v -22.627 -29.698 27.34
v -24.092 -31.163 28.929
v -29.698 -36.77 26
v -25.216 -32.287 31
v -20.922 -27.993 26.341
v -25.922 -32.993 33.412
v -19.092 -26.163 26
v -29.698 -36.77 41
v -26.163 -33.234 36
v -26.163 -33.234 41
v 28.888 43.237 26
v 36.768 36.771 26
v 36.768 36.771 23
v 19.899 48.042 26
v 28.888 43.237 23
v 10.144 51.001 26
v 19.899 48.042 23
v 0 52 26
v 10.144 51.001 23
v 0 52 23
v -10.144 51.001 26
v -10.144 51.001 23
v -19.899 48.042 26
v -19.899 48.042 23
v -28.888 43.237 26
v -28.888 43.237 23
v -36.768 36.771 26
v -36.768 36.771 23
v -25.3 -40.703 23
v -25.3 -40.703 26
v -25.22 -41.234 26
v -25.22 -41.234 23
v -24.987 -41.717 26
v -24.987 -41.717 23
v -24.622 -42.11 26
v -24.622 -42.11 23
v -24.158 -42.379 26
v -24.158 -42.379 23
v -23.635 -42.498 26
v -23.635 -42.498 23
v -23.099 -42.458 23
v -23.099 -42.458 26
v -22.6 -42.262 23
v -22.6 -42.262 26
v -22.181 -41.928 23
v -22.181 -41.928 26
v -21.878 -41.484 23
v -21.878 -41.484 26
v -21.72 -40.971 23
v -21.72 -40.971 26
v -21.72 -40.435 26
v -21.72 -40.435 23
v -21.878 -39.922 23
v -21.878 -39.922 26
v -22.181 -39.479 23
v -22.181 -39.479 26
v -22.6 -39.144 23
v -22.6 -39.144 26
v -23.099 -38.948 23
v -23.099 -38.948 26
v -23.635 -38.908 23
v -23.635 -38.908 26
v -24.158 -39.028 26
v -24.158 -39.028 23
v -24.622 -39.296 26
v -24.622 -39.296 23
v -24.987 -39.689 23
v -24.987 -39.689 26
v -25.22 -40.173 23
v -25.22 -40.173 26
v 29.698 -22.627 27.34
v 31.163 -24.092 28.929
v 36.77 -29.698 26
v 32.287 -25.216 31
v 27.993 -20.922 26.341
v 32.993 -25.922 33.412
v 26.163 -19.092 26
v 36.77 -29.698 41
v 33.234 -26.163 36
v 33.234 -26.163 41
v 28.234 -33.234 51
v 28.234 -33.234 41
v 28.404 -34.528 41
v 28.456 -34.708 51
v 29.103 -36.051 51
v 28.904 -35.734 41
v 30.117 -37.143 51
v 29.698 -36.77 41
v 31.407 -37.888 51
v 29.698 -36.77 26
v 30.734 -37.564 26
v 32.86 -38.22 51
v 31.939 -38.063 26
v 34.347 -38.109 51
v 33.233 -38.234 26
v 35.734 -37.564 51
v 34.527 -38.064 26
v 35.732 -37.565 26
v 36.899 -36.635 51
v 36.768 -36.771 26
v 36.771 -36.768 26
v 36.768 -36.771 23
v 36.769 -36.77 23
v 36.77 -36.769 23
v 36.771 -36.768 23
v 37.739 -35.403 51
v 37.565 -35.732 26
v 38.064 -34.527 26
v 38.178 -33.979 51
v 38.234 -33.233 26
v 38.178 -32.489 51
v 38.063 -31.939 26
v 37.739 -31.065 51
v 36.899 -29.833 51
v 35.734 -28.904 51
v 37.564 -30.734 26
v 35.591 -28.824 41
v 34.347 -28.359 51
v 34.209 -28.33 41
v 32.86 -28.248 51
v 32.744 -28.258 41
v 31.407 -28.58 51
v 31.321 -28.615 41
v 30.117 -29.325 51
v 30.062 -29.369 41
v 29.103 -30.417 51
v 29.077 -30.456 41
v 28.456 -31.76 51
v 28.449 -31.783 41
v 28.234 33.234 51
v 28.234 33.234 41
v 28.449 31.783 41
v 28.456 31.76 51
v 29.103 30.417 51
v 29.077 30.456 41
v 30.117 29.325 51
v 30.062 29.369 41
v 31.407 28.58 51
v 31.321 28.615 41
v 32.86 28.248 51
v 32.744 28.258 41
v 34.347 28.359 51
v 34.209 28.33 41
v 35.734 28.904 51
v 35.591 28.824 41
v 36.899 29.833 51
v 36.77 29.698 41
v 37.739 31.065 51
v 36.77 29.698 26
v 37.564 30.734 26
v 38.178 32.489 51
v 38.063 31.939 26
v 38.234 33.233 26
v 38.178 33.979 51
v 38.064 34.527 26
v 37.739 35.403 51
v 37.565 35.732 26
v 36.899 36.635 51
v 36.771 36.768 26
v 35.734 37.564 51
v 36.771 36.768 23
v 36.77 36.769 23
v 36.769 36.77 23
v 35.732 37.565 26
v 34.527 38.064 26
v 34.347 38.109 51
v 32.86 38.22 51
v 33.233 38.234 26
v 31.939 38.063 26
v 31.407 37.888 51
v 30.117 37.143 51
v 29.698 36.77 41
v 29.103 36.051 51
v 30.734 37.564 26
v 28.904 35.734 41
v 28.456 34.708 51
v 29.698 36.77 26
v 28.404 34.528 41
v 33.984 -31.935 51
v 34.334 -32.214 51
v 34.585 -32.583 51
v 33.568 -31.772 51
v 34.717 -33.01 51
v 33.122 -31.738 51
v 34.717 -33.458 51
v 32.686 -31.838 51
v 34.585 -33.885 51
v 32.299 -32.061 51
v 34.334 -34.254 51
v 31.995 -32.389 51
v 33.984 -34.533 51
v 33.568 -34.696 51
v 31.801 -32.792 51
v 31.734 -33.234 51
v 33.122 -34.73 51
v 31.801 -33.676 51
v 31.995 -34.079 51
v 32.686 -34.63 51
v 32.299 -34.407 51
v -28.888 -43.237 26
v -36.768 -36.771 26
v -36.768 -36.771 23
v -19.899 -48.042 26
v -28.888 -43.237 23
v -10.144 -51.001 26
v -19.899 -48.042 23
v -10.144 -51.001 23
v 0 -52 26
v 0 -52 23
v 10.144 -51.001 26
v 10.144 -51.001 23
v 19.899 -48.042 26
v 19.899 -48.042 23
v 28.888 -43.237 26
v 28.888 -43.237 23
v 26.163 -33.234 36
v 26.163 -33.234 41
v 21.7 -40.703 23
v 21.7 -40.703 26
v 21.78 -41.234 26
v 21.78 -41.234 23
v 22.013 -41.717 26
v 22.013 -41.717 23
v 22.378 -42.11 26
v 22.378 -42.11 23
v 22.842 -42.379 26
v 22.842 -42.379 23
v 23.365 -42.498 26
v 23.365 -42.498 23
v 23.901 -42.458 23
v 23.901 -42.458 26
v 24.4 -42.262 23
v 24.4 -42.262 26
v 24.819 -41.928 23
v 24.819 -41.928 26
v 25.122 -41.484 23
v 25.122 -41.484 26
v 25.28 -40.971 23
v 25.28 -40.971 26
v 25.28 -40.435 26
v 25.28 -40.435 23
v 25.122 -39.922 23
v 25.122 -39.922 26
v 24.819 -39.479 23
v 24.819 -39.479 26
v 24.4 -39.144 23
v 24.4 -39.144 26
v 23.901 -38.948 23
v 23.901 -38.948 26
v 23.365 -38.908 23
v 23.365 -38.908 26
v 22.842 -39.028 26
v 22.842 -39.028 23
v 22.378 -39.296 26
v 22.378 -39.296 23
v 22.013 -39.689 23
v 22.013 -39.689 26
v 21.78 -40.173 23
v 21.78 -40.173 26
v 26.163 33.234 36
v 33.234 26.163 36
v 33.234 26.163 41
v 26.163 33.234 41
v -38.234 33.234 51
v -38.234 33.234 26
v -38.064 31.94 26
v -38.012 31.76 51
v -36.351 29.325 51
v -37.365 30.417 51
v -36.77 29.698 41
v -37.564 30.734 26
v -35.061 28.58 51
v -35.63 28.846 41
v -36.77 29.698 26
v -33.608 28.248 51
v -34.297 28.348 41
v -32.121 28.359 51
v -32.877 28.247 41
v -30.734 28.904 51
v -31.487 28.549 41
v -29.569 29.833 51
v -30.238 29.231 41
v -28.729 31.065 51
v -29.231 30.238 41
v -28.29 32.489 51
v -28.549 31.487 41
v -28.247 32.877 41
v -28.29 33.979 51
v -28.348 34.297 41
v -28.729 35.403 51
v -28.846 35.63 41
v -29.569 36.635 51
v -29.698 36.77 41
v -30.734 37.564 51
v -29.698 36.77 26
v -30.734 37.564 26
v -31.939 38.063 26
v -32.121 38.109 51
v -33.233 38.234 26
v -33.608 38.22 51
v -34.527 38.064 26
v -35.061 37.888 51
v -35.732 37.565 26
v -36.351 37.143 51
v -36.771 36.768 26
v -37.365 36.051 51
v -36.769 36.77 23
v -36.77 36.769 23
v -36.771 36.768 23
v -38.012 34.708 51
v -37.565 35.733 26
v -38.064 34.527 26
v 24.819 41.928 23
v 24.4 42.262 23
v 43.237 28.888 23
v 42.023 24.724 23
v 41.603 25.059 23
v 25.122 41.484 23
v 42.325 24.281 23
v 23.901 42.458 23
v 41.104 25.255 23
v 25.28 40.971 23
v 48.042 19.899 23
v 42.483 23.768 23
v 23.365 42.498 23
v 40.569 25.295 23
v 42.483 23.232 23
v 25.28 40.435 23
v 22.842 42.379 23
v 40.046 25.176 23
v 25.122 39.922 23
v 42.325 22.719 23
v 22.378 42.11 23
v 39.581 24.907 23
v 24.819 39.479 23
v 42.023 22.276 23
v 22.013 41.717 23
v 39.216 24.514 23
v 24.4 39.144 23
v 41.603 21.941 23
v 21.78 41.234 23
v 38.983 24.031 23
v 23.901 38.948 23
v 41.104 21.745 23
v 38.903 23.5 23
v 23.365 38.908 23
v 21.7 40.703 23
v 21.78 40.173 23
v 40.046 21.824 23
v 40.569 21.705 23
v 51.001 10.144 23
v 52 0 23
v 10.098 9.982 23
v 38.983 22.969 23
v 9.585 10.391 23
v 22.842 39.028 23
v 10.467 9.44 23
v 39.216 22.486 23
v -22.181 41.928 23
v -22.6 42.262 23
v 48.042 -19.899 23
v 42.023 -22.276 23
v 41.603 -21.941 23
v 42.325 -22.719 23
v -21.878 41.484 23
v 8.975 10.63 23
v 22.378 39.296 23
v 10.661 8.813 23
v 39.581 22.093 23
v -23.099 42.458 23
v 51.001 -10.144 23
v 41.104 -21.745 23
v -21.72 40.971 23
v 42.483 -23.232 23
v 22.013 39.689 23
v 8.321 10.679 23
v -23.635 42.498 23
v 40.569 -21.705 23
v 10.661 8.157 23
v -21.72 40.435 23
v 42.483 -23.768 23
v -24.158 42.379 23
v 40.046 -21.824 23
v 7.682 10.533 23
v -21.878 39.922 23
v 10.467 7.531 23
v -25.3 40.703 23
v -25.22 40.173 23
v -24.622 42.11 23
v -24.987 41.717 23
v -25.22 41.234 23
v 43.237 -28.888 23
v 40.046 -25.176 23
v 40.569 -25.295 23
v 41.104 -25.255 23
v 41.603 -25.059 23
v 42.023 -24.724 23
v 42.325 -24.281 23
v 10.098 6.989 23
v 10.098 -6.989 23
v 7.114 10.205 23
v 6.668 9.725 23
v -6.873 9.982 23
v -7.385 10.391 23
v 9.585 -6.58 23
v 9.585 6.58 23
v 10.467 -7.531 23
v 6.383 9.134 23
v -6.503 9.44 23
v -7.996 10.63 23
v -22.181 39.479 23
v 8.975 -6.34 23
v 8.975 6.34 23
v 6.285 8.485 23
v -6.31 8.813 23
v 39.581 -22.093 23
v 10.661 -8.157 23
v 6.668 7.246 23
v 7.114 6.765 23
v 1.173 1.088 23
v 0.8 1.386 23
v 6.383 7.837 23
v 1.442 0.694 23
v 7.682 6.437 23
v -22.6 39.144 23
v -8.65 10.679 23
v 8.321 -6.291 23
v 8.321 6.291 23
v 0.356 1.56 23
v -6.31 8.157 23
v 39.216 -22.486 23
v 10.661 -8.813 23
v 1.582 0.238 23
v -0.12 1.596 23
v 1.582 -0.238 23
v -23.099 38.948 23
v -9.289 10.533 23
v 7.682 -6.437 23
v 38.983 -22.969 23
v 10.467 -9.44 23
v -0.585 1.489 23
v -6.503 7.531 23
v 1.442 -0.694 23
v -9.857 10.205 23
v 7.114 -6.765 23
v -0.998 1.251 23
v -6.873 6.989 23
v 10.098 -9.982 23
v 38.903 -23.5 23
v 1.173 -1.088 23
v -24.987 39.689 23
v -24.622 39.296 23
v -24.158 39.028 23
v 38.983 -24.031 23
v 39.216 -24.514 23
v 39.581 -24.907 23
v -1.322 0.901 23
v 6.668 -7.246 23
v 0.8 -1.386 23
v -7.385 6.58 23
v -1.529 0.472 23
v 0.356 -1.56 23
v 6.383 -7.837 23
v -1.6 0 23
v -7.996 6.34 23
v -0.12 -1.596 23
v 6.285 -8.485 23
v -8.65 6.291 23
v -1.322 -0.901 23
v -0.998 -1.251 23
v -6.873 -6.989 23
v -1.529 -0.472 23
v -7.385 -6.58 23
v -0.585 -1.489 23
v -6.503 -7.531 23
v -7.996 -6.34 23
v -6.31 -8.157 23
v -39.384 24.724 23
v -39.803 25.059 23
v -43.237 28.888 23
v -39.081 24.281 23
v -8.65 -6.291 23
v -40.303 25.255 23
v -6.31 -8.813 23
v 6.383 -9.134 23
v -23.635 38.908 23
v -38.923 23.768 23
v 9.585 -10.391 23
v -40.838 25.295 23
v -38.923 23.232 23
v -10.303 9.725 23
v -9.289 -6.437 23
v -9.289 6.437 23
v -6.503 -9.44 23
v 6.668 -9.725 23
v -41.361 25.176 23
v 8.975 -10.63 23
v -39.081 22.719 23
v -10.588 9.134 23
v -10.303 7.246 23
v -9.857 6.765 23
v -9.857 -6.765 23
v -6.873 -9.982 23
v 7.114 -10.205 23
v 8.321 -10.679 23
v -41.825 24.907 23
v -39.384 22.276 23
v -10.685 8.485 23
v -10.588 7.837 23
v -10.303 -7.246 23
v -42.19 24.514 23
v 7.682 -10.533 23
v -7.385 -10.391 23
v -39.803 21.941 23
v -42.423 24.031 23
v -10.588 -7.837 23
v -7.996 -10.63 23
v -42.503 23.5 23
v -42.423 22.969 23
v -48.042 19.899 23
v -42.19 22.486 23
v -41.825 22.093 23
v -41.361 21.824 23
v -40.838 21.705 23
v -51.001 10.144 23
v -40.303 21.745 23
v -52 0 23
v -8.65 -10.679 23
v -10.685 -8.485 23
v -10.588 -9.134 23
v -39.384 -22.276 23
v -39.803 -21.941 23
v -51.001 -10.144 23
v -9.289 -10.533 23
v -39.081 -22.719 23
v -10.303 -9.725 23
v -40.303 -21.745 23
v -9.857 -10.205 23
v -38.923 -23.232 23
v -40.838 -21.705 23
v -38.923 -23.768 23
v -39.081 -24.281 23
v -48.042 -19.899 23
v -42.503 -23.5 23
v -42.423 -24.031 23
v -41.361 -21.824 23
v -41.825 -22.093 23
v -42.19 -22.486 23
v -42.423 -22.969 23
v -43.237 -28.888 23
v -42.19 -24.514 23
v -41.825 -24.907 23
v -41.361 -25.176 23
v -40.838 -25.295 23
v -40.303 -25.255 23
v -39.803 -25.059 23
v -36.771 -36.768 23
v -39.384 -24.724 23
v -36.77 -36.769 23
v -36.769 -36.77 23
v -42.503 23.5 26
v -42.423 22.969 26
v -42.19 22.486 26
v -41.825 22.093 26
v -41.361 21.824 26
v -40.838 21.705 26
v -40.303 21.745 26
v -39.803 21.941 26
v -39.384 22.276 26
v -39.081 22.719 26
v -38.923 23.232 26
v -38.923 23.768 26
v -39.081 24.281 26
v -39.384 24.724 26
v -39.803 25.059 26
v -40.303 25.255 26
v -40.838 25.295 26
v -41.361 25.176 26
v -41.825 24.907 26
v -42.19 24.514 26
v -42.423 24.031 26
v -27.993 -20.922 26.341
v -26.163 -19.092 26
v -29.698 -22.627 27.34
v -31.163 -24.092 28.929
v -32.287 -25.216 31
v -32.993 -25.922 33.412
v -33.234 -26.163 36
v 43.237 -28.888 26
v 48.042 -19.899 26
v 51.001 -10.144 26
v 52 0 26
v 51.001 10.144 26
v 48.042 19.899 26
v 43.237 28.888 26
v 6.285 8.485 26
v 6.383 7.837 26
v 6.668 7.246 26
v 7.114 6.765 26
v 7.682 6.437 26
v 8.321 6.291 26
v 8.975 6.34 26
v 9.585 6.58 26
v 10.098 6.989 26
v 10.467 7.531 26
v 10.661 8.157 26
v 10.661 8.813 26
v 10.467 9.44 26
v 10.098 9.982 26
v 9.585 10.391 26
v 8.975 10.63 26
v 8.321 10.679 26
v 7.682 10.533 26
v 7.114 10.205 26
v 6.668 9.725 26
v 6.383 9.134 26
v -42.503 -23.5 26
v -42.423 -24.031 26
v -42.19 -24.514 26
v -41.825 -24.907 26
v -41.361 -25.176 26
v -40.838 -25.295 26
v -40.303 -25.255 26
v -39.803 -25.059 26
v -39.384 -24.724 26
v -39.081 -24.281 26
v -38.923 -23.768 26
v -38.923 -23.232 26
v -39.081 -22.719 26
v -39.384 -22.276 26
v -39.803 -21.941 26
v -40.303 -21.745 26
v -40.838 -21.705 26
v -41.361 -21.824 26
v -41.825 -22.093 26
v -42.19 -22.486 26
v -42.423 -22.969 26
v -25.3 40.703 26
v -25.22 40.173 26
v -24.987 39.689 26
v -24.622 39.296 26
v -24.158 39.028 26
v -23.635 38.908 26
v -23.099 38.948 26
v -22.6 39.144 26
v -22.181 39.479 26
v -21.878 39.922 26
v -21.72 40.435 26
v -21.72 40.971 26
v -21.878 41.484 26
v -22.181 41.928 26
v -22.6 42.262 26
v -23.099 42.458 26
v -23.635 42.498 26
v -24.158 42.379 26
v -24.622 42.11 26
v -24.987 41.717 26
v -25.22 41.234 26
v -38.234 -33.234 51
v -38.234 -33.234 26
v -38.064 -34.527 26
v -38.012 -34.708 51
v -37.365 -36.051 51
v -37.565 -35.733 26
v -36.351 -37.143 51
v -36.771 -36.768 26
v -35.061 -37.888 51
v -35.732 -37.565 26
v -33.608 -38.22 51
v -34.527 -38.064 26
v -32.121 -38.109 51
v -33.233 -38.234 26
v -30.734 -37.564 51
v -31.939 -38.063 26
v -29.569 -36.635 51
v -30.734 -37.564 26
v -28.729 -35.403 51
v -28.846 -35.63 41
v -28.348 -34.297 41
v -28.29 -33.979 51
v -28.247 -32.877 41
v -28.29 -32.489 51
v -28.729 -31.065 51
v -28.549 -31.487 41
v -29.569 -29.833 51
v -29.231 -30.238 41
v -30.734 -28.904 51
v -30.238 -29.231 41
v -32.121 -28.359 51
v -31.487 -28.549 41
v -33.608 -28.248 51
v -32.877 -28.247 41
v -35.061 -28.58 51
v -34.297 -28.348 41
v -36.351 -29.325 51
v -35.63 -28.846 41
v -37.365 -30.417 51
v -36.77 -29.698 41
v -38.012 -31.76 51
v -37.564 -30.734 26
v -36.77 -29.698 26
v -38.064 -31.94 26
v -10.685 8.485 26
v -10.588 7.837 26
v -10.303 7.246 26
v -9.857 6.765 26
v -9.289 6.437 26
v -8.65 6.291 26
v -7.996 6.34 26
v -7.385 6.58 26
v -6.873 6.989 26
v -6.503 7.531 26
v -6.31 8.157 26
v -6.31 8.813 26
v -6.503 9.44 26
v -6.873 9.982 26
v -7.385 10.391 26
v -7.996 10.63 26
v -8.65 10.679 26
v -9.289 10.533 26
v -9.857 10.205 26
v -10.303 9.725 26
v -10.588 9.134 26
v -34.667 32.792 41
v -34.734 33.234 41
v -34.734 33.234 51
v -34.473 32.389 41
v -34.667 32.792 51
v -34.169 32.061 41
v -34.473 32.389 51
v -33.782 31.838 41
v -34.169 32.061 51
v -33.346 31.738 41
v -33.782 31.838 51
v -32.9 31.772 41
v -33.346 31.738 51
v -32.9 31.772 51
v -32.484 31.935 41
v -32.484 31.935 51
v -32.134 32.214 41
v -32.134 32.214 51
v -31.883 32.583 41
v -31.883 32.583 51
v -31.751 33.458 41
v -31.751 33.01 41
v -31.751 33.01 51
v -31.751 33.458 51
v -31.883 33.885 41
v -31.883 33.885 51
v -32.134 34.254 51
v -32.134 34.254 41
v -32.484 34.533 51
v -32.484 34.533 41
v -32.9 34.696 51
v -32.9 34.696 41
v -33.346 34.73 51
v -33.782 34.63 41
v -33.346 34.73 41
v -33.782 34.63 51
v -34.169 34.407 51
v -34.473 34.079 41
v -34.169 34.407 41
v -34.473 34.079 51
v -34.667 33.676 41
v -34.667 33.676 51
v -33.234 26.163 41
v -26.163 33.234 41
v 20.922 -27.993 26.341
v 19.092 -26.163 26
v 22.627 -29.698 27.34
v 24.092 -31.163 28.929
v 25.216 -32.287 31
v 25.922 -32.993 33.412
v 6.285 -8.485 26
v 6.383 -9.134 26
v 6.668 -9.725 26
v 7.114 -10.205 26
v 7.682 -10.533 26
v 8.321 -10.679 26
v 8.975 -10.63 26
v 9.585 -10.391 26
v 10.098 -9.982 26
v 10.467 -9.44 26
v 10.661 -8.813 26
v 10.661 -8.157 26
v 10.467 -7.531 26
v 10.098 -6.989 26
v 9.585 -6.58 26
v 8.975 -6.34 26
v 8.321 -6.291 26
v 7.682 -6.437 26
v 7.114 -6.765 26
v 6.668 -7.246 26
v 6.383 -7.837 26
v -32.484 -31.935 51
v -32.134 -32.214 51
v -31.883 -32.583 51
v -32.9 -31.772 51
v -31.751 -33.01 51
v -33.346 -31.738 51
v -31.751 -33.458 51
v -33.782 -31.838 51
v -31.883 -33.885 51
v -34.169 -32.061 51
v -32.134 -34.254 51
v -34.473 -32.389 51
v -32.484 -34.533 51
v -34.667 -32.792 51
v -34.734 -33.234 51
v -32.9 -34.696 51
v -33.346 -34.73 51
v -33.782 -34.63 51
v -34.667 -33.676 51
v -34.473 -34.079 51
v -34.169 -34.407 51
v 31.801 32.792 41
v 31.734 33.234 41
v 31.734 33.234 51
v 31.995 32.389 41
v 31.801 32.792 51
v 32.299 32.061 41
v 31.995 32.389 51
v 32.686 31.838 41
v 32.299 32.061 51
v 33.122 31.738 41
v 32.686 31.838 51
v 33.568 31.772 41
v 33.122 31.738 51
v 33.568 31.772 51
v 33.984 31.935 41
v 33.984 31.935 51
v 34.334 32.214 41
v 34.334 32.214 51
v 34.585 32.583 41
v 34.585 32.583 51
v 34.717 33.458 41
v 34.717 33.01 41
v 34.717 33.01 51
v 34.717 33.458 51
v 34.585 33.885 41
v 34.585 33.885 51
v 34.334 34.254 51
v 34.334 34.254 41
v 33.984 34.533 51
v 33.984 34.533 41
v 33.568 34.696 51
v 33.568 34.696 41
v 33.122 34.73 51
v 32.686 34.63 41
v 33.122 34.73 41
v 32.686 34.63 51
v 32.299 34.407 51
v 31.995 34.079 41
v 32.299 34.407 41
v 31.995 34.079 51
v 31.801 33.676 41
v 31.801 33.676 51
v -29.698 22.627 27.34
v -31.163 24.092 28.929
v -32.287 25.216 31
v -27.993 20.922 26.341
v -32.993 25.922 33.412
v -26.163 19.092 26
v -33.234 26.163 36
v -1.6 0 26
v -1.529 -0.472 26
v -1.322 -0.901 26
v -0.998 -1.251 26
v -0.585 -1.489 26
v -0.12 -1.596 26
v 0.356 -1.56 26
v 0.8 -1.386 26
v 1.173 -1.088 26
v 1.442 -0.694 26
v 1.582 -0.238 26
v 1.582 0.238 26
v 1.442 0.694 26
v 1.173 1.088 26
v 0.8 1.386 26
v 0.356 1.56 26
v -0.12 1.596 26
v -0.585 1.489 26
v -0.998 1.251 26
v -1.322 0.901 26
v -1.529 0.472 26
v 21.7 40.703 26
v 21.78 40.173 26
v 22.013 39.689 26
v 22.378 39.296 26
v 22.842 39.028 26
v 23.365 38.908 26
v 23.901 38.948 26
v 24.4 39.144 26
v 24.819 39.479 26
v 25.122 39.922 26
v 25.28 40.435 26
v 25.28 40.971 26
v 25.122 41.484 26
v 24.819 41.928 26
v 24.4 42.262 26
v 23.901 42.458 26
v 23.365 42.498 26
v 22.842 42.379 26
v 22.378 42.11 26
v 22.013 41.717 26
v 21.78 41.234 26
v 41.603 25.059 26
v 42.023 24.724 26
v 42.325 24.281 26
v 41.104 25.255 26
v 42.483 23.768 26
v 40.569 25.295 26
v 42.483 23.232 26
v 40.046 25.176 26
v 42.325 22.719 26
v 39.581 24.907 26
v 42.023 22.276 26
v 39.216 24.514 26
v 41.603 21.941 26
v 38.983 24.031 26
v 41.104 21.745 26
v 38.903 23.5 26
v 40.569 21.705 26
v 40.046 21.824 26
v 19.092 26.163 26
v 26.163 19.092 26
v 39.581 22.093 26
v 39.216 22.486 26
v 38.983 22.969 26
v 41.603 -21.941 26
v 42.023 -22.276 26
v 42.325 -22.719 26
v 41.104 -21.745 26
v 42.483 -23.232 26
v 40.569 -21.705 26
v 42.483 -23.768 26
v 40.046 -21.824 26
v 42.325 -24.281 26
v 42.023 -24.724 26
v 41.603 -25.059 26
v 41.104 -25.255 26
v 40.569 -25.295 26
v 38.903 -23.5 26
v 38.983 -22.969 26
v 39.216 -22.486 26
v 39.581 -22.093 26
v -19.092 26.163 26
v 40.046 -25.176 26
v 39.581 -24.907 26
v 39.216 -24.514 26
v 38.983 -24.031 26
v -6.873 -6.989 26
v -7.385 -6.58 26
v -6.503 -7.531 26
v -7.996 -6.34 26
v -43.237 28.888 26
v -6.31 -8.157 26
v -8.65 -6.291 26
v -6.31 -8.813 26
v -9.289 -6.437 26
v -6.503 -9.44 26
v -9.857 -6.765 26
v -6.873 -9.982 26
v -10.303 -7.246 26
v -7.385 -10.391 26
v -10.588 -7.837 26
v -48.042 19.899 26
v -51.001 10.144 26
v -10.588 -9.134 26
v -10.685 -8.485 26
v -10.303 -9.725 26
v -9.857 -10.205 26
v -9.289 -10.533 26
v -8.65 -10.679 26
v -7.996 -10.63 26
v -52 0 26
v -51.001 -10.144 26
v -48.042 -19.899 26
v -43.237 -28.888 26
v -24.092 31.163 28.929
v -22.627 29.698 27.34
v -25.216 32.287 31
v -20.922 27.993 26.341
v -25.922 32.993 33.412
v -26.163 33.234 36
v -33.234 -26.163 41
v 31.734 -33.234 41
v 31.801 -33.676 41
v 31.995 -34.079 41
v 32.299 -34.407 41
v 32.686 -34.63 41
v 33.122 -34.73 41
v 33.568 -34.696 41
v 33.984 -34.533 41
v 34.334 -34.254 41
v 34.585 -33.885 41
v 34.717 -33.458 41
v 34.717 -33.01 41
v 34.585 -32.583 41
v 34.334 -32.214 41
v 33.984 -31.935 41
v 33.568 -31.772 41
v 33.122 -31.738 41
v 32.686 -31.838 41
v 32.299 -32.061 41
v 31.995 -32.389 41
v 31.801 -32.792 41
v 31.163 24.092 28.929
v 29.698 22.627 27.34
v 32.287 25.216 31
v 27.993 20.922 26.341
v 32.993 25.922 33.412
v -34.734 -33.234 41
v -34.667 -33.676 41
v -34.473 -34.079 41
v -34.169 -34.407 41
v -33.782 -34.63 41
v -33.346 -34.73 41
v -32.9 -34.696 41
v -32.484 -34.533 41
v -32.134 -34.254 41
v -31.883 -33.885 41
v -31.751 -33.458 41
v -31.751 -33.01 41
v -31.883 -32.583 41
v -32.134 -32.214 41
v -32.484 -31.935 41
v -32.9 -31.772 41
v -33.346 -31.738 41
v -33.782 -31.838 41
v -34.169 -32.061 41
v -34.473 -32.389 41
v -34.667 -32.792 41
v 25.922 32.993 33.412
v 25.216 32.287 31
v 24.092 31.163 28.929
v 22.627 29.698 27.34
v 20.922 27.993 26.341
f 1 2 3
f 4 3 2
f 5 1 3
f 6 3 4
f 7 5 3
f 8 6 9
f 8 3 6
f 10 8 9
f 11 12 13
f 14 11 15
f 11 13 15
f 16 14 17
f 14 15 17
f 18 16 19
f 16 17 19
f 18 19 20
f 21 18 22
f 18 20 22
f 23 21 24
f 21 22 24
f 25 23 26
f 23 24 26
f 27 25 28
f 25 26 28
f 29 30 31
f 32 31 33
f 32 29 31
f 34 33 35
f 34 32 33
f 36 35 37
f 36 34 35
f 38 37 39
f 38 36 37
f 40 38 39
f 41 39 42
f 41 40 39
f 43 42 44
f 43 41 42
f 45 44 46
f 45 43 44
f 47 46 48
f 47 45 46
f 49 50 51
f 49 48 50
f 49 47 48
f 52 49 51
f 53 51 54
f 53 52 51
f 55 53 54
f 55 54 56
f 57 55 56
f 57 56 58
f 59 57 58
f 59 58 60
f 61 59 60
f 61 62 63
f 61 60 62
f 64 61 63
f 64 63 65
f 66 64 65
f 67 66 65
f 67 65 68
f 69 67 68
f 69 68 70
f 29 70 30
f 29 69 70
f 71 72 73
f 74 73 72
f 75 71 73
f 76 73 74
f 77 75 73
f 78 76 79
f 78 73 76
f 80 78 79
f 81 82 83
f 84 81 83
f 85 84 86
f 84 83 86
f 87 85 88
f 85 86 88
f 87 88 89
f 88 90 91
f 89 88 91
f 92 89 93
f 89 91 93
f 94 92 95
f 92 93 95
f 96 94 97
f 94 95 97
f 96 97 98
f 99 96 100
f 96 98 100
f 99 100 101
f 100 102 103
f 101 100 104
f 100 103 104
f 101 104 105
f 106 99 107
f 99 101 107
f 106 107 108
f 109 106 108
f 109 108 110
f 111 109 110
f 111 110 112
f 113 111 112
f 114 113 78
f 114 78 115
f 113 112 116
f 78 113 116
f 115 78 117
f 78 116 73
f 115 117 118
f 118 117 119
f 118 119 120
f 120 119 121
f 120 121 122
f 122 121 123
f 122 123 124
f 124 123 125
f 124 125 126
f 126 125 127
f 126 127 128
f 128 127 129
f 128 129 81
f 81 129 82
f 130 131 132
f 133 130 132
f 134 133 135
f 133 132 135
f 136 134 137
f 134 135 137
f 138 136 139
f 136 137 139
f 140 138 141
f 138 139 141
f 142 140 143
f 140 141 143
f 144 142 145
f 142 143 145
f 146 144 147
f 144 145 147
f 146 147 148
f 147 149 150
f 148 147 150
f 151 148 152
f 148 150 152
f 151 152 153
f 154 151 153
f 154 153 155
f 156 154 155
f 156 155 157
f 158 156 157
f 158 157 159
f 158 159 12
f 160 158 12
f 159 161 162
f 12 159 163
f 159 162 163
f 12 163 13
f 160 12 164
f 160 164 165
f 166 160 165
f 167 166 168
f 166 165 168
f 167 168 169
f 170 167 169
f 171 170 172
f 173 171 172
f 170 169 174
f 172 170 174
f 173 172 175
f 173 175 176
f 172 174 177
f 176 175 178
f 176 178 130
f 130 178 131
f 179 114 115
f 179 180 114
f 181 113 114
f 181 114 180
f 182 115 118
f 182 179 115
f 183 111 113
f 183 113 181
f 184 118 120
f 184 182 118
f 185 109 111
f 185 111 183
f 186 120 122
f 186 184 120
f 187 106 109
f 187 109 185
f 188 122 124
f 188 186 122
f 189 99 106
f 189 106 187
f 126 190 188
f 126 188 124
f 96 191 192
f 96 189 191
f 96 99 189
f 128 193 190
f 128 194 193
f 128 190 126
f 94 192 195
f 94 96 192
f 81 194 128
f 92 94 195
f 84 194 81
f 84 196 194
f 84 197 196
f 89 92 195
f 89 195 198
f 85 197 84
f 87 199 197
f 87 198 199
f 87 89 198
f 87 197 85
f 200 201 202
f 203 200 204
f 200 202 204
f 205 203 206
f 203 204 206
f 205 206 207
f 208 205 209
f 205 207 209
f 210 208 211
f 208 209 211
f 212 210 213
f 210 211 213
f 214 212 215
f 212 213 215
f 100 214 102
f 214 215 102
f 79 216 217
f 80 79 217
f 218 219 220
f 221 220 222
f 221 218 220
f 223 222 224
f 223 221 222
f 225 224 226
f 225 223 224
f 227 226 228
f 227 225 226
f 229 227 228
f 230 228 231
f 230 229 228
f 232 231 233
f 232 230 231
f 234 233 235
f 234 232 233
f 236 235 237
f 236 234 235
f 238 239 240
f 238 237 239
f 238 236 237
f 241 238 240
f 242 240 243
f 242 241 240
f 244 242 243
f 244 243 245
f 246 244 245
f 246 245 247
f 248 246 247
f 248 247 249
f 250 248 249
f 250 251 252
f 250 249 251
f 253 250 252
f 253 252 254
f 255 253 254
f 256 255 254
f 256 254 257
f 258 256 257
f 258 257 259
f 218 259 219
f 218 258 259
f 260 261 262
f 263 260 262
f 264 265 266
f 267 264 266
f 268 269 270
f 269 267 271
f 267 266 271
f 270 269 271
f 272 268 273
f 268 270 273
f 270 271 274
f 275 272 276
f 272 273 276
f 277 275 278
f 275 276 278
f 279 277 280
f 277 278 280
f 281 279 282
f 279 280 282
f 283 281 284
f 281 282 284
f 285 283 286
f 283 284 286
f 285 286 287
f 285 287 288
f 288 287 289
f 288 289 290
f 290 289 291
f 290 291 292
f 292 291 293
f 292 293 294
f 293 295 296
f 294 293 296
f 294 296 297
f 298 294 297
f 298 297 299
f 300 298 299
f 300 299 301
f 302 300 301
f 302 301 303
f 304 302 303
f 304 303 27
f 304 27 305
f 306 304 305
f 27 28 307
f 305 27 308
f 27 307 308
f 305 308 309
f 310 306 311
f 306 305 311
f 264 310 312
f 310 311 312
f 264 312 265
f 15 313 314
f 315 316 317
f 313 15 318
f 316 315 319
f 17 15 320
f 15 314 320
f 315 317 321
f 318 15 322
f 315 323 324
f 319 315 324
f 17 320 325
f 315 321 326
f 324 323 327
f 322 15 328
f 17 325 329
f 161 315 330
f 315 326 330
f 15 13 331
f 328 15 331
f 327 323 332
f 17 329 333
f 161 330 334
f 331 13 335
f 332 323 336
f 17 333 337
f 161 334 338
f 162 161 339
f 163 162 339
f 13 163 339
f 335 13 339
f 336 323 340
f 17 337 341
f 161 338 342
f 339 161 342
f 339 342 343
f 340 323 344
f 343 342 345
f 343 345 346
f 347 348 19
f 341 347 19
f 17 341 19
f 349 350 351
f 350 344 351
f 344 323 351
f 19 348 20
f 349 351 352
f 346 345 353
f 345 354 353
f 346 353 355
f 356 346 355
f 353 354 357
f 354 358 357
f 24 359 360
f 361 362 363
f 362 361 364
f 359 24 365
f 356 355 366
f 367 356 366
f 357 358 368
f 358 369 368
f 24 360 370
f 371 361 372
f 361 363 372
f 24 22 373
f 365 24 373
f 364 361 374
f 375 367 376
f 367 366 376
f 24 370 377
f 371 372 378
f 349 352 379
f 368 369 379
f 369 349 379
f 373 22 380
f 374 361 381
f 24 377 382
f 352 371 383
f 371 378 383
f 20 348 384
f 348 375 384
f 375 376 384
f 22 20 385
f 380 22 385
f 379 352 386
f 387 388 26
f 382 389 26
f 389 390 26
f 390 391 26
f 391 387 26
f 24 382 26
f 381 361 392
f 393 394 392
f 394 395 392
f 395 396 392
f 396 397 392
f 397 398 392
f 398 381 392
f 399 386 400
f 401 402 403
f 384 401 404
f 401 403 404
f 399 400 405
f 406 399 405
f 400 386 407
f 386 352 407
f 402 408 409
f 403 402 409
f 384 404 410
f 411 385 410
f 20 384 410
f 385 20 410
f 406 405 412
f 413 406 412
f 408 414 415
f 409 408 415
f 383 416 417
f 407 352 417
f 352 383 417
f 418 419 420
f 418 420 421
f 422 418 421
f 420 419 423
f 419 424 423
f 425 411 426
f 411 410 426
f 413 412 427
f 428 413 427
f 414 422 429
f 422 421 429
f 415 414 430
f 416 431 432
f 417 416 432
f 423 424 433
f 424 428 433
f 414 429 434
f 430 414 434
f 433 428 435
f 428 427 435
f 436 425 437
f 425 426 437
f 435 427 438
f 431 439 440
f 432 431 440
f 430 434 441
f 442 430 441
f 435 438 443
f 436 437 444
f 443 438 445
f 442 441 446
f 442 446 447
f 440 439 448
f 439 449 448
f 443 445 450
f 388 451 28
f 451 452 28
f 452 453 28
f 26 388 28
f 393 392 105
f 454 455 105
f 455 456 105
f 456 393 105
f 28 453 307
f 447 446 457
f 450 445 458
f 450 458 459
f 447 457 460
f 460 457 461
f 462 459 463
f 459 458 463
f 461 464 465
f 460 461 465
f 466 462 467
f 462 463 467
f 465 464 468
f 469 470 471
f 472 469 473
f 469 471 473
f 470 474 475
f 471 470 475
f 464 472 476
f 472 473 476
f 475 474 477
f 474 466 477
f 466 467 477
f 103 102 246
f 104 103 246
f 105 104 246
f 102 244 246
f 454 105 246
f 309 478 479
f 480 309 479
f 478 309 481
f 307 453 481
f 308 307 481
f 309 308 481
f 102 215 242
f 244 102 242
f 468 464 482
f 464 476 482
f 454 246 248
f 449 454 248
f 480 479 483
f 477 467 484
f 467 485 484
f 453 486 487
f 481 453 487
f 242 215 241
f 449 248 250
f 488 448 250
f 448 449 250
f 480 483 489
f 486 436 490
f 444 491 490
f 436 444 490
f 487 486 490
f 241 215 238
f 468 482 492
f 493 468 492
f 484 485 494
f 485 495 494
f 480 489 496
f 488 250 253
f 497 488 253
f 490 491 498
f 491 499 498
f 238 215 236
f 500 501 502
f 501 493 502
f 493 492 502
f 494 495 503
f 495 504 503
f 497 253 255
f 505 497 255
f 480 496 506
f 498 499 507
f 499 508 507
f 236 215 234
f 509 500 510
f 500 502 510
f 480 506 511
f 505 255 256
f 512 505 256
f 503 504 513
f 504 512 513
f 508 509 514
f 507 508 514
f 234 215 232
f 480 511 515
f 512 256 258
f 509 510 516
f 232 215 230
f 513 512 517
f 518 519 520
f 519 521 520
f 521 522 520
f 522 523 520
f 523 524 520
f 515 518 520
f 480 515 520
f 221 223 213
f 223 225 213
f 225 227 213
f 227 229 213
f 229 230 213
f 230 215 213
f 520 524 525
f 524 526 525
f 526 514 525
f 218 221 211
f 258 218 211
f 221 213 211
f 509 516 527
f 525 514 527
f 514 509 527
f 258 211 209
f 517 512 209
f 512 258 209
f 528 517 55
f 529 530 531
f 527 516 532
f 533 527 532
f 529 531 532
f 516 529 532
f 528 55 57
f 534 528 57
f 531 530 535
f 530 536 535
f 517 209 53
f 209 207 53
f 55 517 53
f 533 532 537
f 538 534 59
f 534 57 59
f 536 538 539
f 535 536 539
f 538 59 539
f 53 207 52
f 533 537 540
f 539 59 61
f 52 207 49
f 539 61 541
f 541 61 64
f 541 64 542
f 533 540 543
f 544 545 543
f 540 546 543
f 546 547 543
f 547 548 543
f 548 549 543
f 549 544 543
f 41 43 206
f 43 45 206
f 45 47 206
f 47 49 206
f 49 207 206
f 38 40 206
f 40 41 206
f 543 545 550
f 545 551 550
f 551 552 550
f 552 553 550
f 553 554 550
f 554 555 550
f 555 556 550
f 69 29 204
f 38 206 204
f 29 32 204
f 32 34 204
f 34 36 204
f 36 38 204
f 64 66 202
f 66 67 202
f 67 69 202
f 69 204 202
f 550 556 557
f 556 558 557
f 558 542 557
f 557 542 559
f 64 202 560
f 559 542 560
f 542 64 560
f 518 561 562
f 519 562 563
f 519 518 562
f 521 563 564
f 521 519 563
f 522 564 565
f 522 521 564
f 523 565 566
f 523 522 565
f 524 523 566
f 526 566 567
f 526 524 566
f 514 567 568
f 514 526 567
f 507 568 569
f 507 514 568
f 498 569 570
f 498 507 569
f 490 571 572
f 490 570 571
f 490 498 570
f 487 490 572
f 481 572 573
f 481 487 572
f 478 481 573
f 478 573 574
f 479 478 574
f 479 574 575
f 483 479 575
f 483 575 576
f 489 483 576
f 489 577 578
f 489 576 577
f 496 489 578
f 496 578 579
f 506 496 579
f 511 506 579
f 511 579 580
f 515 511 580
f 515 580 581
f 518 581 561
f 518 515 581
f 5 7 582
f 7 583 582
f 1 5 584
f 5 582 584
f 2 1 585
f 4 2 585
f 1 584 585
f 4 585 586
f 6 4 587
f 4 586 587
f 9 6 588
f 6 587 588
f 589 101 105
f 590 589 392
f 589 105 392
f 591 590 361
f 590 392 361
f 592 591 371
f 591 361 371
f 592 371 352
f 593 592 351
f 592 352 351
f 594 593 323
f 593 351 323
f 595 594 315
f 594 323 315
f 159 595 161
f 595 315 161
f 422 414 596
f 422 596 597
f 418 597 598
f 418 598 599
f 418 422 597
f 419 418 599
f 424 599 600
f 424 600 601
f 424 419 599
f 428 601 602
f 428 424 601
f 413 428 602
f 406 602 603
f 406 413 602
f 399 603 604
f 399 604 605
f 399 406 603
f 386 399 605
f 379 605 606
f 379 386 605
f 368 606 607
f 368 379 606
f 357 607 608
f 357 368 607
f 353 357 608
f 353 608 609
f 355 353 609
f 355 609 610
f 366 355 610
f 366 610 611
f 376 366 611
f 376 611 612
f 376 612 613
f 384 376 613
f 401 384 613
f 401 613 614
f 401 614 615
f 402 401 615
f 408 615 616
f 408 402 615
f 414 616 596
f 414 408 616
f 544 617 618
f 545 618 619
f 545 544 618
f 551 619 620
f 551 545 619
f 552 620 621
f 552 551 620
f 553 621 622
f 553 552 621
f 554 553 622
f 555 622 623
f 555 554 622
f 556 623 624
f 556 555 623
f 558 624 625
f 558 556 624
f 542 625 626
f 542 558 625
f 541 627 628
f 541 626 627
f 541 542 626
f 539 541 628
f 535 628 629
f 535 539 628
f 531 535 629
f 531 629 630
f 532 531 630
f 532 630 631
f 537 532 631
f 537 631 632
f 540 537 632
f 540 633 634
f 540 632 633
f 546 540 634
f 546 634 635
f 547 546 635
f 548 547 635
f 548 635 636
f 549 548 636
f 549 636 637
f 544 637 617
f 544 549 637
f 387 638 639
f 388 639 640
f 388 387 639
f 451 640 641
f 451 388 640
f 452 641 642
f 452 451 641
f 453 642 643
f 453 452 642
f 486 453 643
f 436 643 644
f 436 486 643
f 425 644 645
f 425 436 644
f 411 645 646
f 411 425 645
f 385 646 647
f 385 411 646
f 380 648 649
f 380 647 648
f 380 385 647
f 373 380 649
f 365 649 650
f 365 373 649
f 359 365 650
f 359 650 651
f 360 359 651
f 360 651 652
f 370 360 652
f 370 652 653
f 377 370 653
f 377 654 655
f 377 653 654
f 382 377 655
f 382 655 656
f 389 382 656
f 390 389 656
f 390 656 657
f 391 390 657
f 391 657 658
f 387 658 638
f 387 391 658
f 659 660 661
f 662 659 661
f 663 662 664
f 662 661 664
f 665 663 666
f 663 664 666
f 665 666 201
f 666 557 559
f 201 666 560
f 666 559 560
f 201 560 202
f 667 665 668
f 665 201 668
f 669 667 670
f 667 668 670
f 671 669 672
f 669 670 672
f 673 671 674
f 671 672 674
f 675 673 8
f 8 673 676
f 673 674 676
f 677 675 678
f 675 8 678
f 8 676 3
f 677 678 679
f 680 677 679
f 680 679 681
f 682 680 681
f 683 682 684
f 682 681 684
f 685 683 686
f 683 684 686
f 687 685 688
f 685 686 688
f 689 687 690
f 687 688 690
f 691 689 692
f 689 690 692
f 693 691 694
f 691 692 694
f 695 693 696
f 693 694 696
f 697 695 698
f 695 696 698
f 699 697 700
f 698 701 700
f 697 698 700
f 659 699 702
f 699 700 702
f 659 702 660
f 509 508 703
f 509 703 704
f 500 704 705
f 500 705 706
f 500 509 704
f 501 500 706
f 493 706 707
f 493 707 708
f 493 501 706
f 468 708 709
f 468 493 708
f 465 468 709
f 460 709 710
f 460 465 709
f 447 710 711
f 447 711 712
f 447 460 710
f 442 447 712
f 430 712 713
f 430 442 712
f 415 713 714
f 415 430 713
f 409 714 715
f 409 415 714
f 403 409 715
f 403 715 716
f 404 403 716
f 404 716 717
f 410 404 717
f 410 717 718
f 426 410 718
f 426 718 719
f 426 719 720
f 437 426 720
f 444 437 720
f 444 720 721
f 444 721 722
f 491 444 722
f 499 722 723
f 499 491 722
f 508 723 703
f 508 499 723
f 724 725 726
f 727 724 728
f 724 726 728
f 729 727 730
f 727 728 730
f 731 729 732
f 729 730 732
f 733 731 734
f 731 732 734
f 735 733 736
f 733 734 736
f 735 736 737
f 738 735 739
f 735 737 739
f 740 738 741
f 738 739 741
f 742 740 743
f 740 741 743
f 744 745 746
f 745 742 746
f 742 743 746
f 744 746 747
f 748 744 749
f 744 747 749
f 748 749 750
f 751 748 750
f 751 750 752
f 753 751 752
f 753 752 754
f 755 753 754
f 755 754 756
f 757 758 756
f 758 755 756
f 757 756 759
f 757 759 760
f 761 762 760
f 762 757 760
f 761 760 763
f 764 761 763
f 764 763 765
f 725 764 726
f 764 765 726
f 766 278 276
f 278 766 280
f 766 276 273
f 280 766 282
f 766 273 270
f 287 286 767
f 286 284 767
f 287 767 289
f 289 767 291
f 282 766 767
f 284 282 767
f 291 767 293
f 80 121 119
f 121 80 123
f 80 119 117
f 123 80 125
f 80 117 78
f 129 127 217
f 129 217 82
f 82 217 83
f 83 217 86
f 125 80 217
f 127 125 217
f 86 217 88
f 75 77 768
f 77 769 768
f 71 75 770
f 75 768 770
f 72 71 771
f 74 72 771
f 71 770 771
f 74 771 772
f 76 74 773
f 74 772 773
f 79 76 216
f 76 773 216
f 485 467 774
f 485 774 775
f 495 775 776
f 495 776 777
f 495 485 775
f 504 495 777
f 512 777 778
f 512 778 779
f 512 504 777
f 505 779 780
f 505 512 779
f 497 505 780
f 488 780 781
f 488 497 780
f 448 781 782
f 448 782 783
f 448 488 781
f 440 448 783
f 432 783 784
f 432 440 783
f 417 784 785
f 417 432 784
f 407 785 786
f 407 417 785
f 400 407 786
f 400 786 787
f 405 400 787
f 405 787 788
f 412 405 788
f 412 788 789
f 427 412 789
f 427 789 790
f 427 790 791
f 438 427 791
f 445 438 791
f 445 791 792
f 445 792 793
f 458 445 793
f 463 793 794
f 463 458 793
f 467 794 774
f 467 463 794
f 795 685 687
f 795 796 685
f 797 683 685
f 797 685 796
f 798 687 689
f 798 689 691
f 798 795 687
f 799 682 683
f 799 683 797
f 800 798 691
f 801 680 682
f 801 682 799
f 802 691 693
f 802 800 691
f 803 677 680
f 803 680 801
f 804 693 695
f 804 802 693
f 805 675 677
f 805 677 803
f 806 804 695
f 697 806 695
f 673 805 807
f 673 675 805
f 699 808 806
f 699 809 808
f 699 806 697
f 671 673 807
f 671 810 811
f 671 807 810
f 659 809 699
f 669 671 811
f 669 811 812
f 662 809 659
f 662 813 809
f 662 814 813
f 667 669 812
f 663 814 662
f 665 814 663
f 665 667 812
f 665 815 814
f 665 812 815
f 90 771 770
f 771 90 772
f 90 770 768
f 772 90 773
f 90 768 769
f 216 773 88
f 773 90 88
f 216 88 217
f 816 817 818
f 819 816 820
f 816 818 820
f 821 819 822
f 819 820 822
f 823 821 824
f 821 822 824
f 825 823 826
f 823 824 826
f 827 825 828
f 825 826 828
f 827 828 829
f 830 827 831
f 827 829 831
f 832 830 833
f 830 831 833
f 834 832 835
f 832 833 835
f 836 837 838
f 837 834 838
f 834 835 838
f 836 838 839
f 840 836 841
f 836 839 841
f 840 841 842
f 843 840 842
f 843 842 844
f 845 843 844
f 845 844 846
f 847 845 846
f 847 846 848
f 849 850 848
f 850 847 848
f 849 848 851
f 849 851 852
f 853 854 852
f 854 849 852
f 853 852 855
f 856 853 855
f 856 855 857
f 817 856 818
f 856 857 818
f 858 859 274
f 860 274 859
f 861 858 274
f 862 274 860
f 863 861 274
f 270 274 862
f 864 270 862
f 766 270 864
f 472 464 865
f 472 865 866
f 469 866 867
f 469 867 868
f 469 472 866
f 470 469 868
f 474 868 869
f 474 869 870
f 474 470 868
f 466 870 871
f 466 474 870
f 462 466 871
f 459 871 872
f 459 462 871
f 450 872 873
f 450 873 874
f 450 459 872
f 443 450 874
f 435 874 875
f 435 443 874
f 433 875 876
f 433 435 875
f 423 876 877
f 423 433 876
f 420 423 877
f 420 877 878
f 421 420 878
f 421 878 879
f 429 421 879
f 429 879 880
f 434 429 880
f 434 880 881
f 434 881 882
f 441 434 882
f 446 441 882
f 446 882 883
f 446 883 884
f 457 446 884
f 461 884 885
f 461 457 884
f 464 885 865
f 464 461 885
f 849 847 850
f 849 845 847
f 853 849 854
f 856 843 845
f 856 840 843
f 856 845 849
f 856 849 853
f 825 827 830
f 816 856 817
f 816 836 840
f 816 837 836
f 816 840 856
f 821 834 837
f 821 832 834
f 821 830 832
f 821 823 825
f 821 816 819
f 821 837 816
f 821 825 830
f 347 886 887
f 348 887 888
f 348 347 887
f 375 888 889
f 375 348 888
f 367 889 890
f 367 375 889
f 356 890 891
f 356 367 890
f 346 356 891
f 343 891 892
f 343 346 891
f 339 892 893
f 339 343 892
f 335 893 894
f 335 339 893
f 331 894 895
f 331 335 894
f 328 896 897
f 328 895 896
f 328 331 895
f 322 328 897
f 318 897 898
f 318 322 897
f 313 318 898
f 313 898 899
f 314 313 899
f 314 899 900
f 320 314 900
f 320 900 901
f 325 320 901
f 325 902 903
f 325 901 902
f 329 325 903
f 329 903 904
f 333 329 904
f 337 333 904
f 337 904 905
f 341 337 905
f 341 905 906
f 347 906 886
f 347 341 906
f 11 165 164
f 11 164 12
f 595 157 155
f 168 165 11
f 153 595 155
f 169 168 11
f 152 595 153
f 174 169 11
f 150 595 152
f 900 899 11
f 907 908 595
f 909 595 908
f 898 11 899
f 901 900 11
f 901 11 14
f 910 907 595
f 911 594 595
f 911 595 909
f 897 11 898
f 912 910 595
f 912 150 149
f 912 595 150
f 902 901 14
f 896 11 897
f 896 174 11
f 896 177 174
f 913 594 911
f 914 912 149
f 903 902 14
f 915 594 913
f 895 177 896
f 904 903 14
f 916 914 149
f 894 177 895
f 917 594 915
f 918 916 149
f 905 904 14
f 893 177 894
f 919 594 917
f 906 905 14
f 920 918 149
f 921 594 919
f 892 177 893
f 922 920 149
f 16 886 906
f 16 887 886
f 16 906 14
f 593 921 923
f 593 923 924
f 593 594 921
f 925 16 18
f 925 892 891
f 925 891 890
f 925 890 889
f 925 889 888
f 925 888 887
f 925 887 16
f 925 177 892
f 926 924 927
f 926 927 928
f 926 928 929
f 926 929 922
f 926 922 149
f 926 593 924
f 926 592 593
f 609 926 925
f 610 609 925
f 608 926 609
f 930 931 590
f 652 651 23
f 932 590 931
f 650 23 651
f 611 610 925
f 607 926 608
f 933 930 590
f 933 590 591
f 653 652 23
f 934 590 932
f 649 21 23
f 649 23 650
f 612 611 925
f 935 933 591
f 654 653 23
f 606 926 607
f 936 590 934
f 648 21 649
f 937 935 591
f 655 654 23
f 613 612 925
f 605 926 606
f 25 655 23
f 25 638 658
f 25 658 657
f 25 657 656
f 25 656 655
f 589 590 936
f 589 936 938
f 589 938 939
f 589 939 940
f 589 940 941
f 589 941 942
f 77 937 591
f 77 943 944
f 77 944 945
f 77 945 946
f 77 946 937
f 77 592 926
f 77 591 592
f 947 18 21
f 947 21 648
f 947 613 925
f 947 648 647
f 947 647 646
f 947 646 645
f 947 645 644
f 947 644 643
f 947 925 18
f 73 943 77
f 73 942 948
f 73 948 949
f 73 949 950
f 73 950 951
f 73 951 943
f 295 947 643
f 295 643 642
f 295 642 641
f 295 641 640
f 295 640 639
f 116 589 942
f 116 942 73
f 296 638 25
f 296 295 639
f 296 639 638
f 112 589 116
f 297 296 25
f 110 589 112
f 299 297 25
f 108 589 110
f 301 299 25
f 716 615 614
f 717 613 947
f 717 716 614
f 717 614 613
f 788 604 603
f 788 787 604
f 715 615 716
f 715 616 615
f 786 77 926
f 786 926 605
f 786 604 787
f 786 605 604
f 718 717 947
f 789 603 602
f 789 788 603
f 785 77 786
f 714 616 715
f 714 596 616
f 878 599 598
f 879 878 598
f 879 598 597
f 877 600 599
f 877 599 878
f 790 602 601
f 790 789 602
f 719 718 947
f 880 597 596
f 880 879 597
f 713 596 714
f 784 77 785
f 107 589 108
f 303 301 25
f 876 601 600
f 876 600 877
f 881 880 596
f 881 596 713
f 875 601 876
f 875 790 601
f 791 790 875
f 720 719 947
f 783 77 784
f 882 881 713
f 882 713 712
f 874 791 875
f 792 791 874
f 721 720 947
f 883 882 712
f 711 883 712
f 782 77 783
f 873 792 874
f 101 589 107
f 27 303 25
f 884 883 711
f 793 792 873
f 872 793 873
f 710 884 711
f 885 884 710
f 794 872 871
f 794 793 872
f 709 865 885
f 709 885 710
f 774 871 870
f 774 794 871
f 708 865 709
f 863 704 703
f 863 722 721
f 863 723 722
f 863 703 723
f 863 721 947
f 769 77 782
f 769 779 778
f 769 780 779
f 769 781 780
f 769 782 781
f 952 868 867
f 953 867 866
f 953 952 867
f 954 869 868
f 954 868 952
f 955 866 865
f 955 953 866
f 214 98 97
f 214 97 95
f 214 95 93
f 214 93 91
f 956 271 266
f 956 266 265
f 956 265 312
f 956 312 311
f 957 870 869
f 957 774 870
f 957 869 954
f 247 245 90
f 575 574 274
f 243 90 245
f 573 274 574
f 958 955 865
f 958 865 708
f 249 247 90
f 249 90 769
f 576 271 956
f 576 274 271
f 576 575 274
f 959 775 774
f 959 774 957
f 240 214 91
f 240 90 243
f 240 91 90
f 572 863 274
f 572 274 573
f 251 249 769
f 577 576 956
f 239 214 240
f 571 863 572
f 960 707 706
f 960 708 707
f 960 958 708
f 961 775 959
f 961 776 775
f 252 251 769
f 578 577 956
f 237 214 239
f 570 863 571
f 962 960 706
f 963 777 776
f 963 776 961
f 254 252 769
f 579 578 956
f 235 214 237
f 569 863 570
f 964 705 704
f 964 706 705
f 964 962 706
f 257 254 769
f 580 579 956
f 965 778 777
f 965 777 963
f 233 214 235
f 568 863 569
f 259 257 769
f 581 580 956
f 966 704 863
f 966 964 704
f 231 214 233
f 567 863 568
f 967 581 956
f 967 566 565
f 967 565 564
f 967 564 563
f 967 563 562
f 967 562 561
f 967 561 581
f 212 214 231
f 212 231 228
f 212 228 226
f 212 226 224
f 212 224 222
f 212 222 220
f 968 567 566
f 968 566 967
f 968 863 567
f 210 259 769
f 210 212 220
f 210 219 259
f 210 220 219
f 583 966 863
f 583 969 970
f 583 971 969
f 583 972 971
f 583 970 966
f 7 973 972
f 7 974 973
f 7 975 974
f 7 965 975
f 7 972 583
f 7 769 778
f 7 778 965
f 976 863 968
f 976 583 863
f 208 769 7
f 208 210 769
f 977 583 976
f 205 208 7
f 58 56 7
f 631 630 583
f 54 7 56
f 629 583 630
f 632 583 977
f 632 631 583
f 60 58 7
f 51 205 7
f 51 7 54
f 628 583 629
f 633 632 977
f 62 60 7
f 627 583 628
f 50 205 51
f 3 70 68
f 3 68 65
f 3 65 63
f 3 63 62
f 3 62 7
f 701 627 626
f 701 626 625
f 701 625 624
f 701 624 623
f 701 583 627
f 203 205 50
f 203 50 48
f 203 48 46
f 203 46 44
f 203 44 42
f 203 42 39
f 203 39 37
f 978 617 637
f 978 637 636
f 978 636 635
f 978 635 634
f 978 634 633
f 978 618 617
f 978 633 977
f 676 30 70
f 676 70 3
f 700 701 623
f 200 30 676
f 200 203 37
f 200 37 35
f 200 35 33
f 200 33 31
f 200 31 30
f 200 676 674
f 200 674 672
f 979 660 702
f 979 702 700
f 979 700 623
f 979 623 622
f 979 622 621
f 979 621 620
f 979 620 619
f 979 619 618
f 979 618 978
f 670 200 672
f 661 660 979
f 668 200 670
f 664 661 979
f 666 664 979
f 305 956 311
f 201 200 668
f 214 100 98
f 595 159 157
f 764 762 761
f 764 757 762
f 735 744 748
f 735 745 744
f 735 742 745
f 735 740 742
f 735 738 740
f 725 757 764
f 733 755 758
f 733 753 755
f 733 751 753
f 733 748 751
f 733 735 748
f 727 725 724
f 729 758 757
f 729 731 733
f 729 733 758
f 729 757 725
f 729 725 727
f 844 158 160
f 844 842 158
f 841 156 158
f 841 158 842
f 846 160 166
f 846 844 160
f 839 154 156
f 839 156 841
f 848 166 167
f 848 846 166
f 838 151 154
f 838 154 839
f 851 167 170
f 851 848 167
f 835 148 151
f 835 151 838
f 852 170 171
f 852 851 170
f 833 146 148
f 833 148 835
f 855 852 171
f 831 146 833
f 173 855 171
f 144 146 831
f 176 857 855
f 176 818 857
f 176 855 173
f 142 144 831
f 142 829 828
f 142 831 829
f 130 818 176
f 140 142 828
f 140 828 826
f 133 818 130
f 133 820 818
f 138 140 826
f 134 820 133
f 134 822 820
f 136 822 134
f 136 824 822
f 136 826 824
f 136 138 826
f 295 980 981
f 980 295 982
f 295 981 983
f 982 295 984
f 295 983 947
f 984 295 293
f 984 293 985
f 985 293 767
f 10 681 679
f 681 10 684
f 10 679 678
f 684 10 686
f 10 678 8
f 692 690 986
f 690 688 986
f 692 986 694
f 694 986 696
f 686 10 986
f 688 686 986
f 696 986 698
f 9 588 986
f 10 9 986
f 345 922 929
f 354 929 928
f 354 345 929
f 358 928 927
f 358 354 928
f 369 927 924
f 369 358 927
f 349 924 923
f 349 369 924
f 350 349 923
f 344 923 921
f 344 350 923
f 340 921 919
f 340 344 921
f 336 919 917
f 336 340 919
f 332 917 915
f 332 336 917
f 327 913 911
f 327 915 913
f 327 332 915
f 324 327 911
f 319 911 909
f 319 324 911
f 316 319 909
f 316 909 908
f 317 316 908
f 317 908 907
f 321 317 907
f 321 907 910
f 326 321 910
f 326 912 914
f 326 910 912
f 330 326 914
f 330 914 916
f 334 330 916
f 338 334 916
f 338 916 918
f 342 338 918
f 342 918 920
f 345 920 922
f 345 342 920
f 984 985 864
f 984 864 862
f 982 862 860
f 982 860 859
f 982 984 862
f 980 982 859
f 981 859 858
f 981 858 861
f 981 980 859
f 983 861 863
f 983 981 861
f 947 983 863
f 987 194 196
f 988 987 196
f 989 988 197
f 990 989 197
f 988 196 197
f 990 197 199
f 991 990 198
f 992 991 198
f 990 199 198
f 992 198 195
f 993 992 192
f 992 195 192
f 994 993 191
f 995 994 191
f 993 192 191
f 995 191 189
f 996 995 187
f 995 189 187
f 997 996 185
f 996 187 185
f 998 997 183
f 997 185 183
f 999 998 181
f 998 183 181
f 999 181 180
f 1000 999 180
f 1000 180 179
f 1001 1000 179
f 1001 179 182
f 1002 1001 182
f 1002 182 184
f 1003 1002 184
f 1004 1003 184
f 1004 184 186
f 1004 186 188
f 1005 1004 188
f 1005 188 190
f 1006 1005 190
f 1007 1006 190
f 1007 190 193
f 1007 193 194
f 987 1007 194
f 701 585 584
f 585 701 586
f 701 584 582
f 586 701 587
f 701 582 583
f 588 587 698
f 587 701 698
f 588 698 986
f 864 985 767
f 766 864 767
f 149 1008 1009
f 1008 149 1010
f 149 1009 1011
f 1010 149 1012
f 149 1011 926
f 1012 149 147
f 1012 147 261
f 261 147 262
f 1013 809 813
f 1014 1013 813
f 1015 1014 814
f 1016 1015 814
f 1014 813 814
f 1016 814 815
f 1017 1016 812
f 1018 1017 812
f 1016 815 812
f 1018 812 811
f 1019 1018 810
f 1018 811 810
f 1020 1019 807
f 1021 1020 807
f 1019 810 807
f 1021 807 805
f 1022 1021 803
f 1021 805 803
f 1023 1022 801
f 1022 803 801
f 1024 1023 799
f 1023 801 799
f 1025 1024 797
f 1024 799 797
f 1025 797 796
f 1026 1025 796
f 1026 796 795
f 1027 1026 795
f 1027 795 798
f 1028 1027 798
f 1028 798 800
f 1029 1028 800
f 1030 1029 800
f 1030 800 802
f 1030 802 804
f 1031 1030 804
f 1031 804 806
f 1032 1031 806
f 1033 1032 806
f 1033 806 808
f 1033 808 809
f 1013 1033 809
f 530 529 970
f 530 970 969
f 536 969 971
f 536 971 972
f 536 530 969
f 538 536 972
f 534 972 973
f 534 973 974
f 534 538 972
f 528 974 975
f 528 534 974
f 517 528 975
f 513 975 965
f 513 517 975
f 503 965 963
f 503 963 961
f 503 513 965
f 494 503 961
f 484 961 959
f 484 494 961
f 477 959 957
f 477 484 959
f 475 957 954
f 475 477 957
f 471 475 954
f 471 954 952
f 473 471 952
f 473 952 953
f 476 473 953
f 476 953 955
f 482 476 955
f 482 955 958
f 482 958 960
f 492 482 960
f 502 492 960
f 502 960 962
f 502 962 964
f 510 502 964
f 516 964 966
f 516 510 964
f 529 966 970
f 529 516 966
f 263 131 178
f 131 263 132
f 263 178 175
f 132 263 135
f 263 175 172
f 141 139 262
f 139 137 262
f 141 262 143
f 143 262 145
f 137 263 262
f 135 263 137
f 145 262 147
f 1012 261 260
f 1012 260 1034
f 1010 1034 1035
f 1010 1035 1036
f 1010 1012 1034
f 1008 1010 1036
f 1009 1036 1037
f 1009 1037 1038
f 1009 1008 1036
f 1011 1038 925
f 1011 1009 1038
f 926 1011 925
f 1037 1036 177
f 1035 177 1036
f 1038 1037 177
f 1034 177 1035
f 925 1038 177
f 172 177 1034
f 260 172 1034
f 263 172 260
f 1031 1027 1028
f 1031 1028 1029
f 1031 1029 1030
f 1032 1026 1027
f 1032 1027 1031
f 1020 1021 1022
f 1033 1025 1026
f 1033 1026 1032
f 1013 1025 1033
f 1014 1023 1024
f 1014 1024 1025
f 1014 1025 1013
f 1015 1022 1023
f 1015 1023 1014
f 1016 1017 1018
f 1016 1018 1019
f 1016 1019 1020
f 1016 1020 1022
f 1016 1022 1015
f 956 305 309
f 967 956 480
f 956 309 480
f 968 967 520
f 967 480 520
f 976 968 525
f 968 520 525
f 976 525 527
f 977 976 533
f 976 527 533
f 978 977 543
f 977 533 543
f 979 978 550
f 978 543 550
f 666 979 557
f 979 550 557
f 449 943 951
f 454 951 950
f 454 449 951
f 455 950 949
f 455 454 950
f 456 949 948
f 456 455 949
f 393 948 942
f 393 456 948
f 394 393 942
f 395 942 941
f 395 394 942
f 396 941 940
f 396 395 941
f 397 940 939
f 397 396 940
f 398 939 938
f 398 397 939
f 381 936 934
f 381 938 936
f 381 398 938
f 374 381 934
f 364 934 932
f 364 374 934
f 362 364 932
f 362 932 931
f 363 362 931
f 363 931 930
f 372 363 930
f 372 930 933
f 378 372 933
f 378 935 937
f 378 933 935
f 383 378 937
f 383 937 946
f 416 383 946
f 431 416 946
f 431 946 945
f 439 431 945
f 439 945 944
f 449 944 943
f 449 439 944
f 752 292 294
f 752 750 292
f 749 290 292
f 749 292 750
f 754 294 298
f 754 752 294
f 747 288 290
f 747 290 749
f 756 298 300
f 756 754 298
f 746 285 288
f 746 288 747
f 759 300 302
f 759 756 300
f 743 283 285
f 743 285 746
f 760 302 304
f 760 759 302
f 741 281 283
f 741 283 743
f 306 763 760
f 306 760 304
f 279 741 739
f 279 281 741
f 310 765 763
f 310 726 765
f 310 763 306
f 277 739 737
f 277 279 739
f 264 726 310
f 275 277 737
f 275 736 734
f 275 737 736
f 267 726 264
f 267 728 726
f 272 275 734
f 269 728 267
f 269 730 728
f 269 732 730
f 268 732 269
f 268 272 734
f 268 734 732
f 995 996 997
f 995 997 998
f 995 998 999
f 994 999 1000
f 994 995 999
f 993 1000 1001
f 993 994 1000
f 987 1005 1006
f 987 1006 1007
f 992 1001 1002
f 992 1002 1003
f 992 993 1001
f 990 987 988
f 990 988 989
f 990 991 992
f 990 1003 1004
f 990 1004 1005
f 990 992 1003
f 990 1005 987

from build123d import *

# Parameters (mm, degrees)
SKETCH003_R             = 52
SKETCH003_R_2           = 1.6
SKETCH003_R_3           = 2.2
PAD002_DEPTH            = 3
SKETCH005_R             = 5
PAD004_DEPTH            = 28
SKETCH007_R             = 1.5
POCKET002_DEPTH         = 10
SKETCH011_R             = 1.8
POCKET004_DEPTH         = 5
PAD011_DEPTH            = 5
PAD012_DEPTH            = 5
BODY001_PLACEMENT_ANGLE = 180


with BuildPart() as part:
    # Sketch003 → Pad002 (new body)
    with BuildSketch(Plane.XY):
        Circle(SKETCH003_R)
        Circle(SKETCH003_R_2, mode=Mode.SUBTRACT)
        with Locations((8.485281, 8.485281)):
            Circle(SKETCH003_R_3, mode=Mode.SUBTRACT)
        with Locations((-8.485281, 8.485281)):
            Circle(SKETCH003_R_3, mode=Mode.SUBTRACT)
        with Locations((-8.485281, -8.485281)):
            Circle(SKETCH003_R_3, mode=Mode.SUBTRACT)
        with Locations((8.485281, -8.485281)):
            Circle(SKETCH003_R_3, mode=Mode.SUBTRACT)
    extrude(amount=PAD002_DEPTH)

    # Sketch005 → Pad004 (join)
    with BuildSketch(Plane.XY):
        with Locations((33.234019, 33.234019)):
            Circle(SKETCH005_R)
        with Locations((-33.234019, 33.234019)):
            Circle(SKETCH005_R)
        with Locations((-33.234019, -33.234019)):
            Circle(SKETCH005_R)
        with Locations((33.234019, -33.234019)):
            Circle(SKETCH005_R)
    extrude(amount=PAD004_DEPTH)

    # Sketch007 → Pocket002 (cut)
    with BuildSketch(Plane.XY.offset(28)):
        with Locations((33.234019, 33.234019)):
            Circle(SKETCH007_R)
        with Locations((-33.234019, 33.234019)):
            Circle(SKETCH007_R)
        with Locations((-33.234019, -33.234019)):
            Circle(SKETCH007_R)
        with Locations((33.234019, -33.234019)):
            Circle(SKETCH007_R)
    extrude(amount=-POCKET002_DEPTH, mode=Mode.SUBTRACT)

    # Sketch011 → Pocket004 (cut)
    with BuildSketch(Plane.XY):
        with Locations((23.5, 40.703194)):
            Circle(SKETCH011_R)
        with Locations((-40.703194, 23.5)):
            Circle(SKETCH011_R)
        with Locations((-23.5, -40.703194)):
            Circle(SKETCH011_R)
        with Locations((40.703194, -23.5)):
            Circle(SKETCH011_R)
        with Locations((-23.5, 40.703194)):
            Circle(SKETCH011_R)
        with Locations((40.703194, 23.5)):
            Circle(SKETCH011_R)
        with Locations((23.5, -40.703194)):
            Circle(SKETCH011_R)
        with Locations((-40.703194, -23.5)):
            Circle(SKETCH011_R)
    extrude(amount=POCKET004_DEPTH, mode=Mode.SUBTRACT)

    # Sketch018 → Pad011 (join, symmetric)
    with BuildSketch(Plane(origin=(0, 0, 0), x_dir=(-0.707107, 0.707107, 0), z_dir=(0.707107, 0.707107, 0))):
        with BuildLine():
            Line((-47, 18), (-47, 3))
            Line((-47, 3), (-32, 3))
            ThreePointArc((-42, 13), (-39.071068, 5.928932), (-32, 3))
            Line((-42, 13), (-42, 18))
            Line((-42, 18), (-47, 18))
        make_face()
        with BuildLine():
            Line((47, 18), (47, 3))
            Line((47, 3), (32, 3))
            ThreePointArc((32, 3), (39.071068, 5.928932), (42, 13))
            Line((42, 13), (42, 18))
            Line((42, 18), (47, 18))
        make_face()
    extrude(amount=PAD011_DEPTH, both=True)

    # Sketch019 → Pad012 (join, symmetric)
    with BuildSketch(Plane(origin=(0, 0, 0), x_dir=(0.707107, 0.707107, 0), z_dir=(0.707107, -0.707107, 0))):
        with BuildLine():
            Line((-47, 18), (-47, 3))
            Line((-47, 3), (-32, 3))
            ThreePointArc((-42, 13), (-39.071068, 5.928932), (-32, 3))
            Line((-42, 13), (-42, 18))
            Line((-42, 18), (-47, 18))
        make_face()
        with BuildLine():
            Line((47, 18), (47, 3))
            Line((47, 3), (32, 3))
            ThreePointArc((32, 3), (39.071068, 5.928932), (42, 13))
            Line((42, 13), (42, 18))
            Line((42, 18), (47, 18))
        make_face()
    extrude(amount=PAD012_DEPTH, both=True)


with BuildPart() as part_1:
    # Body001 placement: moved
    add(part.part.moved(Location((0, 0, 23))).rotate(Axis((0, 0, 23), (0, 0, -1)), BODY001_PLACEMENT_ANGLE))


solid = part_1.part
